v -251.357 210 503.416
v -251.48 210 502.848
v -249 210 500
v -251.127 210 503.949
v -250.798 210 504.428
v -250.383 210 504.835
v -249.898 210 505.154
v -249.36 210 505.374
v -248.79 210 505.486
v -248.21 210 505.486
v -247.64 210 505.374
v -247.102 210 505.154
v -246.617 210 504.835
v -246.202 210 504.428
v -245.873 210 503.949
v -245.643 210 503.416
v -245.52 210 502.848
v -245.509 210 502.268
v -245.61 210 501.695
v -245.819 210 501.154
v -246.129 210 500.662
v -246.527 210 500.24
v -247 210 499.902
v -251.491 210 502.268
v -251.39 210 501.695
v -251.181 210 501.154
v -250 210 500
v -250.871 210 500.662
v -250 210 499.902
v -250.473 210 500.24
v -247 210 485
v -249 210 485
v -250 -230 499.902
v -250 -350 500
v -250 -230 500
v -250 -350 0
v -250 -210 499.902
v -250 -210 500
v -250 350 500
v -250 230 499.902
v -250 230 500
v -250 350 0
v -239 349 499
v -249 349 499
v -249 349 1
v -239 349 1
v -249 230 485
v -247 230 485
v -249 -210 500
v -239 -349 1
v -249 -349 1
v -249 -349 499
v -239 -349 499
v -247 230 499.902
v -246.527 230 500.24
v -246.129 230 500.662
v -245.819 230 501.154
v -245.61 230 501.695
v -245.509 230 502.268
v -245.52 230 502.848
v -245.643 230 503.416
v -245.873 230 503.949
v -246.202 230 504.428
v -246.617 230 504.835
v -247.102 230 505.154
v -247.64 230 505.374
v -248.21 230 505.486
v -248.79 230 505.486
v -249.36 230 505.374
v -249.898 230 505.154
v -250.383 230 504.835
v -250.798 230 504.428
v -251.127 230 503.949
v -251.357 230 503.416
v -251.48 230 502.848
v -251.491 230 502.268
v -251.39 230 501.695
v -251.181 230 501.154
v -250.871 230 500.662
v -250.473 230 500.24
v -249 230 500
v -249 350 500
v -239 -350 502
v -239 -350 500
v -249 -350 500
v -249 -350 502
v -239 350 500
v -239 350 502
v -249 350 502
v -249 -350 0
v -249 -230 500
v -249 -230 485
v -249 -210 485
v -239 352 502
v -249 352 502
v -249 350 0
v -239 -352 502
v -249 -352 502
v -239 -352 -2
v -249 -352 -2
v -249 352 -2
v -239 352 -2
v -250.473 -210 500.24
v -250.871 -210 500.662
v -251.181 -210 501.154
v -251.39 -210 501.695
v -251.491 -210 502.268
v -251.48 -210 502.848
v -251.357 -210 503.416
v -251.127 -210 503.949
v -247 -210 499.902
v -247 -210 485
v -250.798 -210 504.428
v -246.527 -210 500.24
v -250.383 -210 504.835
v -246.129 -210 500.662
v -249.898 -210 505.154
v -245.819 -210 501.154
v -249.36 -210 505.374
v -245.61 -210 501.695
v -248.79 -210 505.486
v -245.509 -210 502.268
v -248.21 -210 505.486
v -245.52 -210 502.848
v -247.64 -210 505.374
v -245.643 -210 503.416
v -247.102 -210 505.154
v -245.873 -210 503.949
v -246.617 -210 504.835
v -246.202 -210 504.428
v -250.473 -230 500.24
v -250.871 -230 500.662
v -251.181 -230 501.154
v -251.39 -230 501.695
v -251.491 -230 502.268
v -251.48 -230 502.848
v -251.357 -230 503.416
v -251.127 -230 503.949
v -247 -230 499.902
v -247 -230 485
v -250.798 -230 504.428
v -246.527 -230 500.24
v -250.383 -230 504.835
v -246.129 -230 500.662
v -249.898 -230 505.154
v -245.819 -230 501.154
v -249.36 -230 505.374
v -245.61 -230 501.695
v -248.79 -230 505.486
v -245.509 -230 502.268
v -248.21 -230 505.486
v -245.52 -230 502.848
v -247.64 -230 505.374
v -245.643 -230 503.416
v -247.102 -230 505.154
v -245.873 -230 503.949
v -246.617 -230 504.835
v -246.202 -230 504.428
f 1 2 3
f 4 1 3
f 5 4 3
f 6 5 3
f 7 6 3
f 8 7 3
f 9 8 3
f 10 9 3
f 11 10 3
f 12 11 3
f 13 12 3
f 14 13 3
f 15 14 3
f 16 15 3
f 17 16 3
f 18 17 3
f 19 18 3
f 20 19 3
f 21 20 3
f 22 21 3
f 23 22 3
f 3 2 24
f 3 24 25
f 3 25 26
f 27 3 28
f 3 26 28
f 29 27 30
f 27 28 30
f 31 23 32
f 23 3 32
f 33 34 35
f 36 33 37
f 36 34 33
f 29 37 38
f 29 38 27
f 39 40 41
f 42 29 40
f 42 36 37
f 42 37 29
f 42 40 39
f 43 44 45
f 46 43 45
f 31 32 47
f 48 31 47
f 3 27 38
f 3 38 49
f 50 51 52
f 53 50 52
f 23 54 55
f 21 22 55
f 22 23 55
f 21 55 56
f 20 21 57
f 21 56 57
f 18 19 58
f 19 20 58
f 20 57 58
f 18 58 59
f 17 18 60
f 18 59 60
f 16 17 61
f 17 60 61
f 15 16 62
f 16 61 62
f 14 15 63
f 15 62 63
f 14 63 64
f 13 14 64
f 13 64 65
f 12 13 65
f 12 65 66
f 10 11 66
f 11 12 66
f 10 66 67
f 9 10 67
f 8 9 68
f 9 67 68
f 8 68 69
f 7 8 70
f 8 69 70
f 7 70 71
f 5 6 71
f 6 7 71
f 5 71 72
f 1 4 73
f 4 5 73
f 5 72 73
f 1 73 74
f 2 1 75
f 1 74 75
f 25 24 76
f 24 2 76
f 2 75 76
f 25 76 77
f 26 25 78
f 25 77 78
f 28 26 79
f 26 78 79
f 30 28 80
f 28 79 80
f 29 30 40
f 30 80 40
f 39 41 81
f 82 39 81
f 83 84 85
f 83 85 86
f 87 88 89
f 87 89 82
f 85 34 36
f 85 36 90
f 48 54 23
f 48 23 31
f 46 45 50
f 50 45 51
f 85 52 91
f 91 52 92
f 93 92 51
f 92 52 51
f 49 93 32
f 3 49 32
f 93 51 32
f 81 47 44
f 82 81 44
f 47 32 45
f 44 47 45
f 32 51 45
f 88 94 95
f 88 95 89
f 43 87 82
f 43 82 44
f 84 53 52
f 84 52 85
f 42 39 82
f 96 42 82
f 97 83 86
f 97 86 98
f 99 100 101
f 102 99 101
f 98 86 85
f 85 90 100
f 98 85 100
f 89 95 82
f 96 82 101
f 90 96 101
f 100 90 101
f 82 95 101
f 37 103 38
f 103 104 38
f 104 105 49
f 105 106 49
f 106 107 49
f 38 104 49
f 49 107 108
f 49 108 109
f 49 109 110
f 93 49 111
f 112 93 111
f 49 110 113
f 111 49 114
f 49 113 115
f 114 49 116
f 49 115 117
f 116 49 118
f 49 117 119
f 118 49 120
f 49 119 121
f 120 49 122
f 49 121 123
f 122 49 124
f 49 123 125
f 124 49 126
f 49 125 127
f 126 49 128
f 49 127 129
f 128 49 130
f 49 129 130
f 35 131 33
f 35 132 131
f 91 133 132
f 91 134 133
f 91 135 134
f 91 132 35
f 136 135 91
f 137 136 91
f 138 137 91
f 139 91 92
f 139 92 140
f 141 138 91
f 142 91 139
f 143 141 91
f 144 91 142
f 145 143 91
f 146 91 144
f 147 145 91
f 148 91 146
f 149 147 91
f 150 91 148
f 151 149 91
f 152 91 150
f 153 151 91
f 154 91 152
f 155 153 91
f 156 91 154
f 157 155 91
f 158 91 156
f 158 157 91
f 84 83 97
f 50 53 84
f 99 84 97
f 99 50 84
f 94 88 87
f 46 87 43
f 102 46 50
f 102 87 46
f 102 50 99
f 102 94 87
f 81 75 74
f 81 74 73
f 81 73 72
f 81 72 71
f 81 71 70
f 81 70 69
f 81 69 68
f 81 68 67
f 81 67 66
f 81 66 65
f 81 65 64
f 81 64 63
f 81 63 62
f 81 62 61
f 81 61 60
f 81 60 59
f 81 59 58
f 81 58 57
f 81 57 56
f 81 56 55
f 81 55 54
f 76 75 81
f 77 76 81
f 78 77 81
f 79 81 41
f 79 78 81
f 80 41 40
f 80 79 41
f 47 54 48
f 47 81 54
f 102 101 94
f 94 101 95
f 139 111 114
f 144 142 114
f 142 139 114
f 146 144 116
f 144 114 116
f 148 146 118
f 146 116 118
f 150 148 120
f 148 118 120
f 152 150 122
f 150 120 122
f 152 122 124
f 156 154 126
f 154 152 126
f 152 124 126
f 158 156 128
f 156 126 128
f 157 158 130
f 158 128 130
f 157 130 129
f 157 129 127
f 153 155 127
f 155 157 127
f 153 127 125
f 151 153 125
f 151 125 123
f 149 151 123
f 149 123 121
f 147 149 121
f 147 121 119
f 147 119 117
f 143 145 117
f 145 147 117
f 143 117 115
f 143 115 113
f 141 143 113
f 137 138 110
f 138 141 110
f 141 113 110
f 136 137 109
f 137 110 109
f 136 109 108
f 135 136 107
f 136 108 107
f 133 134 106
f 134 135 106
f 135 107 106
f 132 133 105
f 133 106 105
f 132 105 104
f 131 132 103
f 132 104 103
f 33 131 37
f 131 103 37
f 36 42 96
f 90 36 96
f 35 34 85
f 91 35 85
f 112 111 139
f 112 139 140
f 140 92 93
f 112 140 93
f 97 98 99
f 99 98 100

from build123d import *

# Parameters (mm, degrees)
CROQUIS1_W              = 500
CROQUIS1_H              = 700
SALIENTE_EXTRUIR1_DEPTH = 500
VACIADO1_T              = -1
CROQUIS2_W              = 15
CROQUIS2_H              = 20
SALIENTE_EXTRUIR2_DEPTH = 2
SALIENTE_EXTRUIR3_START = -20
CROQUIS3_R              = 3
SALIENTE_EXTRUIR3_DEPTH = 20
SALIENTE_EXTRUIR4_START = -20
SALIENTE_EXTRUIR4_DEPTH = 20
CORTAR_EXTRUIR1_DEPTH   = 792.853048236
CROQUIS6_R              = 797.844751534
CORTAR_EXTRUIR2_DEPTH   = 50
CROQUIS7_W              = 449
CROQUIS7_H              = 499
CORTAR_EXTRUIR3_DEPTH   = 50
CROQUIS8_W              = 449
CROQUIS8_H              = 699
CORTAR_EXTRUIR4_DEPTH   = 50
CROQUIS9_W              = 449
CROQUIS9_H              = 500
CORTAR_EXTRUIR5_DEPTH   = 50
SALIENTE_EXTRUIR5_DEPTH = 10


with BuildPart() as part:
    # Croquis1 → Saliente-Extruir1 (new body)
    with BuildSketch(Plane.XY):
        Rectangle(CROQUIS1_W, CROQUIS1_H)
    extrude(amount=SALIENTE_EXTRUIR1_DEPTH)

    # Vaciado1
    vaciado1_openings = [part.faces().sort_by_distance(p)[0] for p in [
        (0, 0, 500),
    ]]
    offset(amount=VACIADO1_T, openings=vaciado1_openings, kind=Kind.INTERSECTION)

    # Croquis2 → Saliente-Extruir2 (add)
    with BuildSketch(Plane(origin=(-249, 0, 0), x_dir=(0, 0, -1), z_dir=(1, 0, 0))):
        with Locations((-492.5, 220)):
            Rectangle(CROQUIS2_W, CROQUIS2_H)
        with Locations((-492.5, -220)):
            Rectangle(CROQUIS2_W, CROQUIS2_H)
    extrude(amount=SALIENTE_EXTRUIR2_DEPTH)

    # Croquis3 → Saliente-Extruir3 (add)
    with BuildSketch(Plane.XZ.offset(230).offset(SALIENTE_EXTRUIR3_START)):
        with Locations((-248.5, 502.5)):
            Circle(CROQUIS3_R)
    extrude(amount=SALIENTE_EXTRUIR3_DEPTH)

    # Croquis4 → Saliente-Extruir4 (add)
    with BuildSketch(Plane.XZ.offset(-210).offset(SALIENTE_EXTRUIR4_START)):
        with BuildLine():
            Line((-250, 499.901923789), (-247, 499.901923789))
            ThreePointArc((-247, 499.901923789), (-248.5, 505.5), (-250, 499.901923789))
        make_face()
    extrude(amount=SALIENTE_EXTRUIR4_DEPTH)

    # Croquis5 → Cortar-Extruir1 (cut, through all)
    with BuildSketch(Plane(origin=(-249, 0, 0), x_dir=(0, 0, -1), z_dir=(1, 0, 0))):
        Polygon((-485, -210), (-485, -230), (-500, -230), (-500, -349), (-1, -349), (-1, 349), (-500, 349), (-500, 230), (-485, 230), (-485, 210), (-500, 210), (-500, -210), align=None)
    extrude(amount=CORTAR_EXTRUIR1_DEPTH, mode=Mode.SUBTRACT)


with BuildPart() as cortar_extruir1_piece_1:
    # of the separate pieces the step leaves, piece 1, a body of its own (cortar_extruir1_pieces)
    add(part.part.solids().sort_by_distance((-250, -350, 0))[0])


with BuildPart() as cortar_extruir1_piece_2:
    # of the separate pieces the step leaves, piece 2, a body of its own (cortar_extruir1_pieces)
    add(part.part.solids().sort_by_distance((250, 210, 500))[0])


with BuildPart() as cortar_extruir1_piece_3:
    # of the separate pieces the step leaves, piece 3, a body of its own (cortar_extruir1_pieces)
    add(part.part.solids().sort_by_distance((250, -230, 485))[0])


with BuildPart() as cortar_extruir2_tool:
    # Croquis6 → Cortar-Extruir2 (new body)
    with BuildSketch(Plane(origin=(250, 0, 0), x_dir=(0, 0, -1), z_dir=(1, 0, 0))):
        with Locations((-1, 0)):
            Circle(CROQUIS6_R)
    extrude(amount=-CORTAR_EXTRUIR2_DEPTH)


with BuildPart() as cortar_extruir1_piece_1_1:
    add(cortar_extruir1_piece_1.part)

    # Cortar-Extruir2: cut by cortar_extruir2_tool
    add(cortar_extruir2_tool.part, mode=Mode.SUBTRACT)

    # Croquis7 → Cortar-Extruir3 (cut)
    with BuildSketch(Plane(origin=(0, -349, 0), x_dir=(1, 0, 0), z_dir=(0, 1, 0))):
        with Locations((-24.5, -250.5)):
            Rectangle(CROQUIS7_W, CROQUIS7_H)
    extrude(amount=-CORTAR_EXTRUIR3_DEPTH, mode=Mode.SUBTRACT)

    # Croquis8 → Cortar-Extruir4 (cut)
    with BuildSketch(Plane.XY.offset(1)):
        with Locations((-24.5, -0.5)):
            Rectangle(CROQUIS8_W, CROQUIS8_H)
    extrude(amount=-CORTAR_EXTRUIR4_DEPTH, mode=Mode.SUBTRACT)

    # Croquis9 → Cortar-Extruir5 (cut)
    with BuildSketch(Plane.XZ.offset(-349)):
        with Locations((-24.5, 250)):
            Rectangle(CROQUIS9_W, CROQUIS9_H)
    extrude(amount=-CORTAR_EXTRUIR5_DEPTH, mode=Mode.SUBTRACT)

    # Croquis10 → Saliente-Extruir5 (add)
    with BuildSketch(Plane(origin=(-249, 0, 0), x_dir=(0, 0, -1), z_dir=(1, 0, 0))):
        Polygon((2, -352), (2, 352), (-502, 352), (-502, 350), (-500, 350), (-499, 349), (-1, 349), (-1, -349), (-499, -349), (-500, -350), (-502, -350), (-502, -352), align=None)
    extrude(amount=SALIENTE_EXTRUIR5_DEPTH)


with BuildPart() as cortar_extruir1_piece_2_1:
    add(cortar_extruir1_piece_2.part)

    # Cortar-Extruir2: cut by cortar_extruir2_tool
    add(cortar_extruir2_tool.part, mode=Mode.SUBTRACT)


with BuildPart() as cortar_extruir1_piece_3_1:
    add(cortar_extruir1_piece_3.part)

    # Cortar-Extruir2: cut by cortar_extruir2_tool
    add(cortar_extruir2_tool.part, mode=Mode.SUBTRACT)


solid = cortar_extruir1_piece_1_1.part
